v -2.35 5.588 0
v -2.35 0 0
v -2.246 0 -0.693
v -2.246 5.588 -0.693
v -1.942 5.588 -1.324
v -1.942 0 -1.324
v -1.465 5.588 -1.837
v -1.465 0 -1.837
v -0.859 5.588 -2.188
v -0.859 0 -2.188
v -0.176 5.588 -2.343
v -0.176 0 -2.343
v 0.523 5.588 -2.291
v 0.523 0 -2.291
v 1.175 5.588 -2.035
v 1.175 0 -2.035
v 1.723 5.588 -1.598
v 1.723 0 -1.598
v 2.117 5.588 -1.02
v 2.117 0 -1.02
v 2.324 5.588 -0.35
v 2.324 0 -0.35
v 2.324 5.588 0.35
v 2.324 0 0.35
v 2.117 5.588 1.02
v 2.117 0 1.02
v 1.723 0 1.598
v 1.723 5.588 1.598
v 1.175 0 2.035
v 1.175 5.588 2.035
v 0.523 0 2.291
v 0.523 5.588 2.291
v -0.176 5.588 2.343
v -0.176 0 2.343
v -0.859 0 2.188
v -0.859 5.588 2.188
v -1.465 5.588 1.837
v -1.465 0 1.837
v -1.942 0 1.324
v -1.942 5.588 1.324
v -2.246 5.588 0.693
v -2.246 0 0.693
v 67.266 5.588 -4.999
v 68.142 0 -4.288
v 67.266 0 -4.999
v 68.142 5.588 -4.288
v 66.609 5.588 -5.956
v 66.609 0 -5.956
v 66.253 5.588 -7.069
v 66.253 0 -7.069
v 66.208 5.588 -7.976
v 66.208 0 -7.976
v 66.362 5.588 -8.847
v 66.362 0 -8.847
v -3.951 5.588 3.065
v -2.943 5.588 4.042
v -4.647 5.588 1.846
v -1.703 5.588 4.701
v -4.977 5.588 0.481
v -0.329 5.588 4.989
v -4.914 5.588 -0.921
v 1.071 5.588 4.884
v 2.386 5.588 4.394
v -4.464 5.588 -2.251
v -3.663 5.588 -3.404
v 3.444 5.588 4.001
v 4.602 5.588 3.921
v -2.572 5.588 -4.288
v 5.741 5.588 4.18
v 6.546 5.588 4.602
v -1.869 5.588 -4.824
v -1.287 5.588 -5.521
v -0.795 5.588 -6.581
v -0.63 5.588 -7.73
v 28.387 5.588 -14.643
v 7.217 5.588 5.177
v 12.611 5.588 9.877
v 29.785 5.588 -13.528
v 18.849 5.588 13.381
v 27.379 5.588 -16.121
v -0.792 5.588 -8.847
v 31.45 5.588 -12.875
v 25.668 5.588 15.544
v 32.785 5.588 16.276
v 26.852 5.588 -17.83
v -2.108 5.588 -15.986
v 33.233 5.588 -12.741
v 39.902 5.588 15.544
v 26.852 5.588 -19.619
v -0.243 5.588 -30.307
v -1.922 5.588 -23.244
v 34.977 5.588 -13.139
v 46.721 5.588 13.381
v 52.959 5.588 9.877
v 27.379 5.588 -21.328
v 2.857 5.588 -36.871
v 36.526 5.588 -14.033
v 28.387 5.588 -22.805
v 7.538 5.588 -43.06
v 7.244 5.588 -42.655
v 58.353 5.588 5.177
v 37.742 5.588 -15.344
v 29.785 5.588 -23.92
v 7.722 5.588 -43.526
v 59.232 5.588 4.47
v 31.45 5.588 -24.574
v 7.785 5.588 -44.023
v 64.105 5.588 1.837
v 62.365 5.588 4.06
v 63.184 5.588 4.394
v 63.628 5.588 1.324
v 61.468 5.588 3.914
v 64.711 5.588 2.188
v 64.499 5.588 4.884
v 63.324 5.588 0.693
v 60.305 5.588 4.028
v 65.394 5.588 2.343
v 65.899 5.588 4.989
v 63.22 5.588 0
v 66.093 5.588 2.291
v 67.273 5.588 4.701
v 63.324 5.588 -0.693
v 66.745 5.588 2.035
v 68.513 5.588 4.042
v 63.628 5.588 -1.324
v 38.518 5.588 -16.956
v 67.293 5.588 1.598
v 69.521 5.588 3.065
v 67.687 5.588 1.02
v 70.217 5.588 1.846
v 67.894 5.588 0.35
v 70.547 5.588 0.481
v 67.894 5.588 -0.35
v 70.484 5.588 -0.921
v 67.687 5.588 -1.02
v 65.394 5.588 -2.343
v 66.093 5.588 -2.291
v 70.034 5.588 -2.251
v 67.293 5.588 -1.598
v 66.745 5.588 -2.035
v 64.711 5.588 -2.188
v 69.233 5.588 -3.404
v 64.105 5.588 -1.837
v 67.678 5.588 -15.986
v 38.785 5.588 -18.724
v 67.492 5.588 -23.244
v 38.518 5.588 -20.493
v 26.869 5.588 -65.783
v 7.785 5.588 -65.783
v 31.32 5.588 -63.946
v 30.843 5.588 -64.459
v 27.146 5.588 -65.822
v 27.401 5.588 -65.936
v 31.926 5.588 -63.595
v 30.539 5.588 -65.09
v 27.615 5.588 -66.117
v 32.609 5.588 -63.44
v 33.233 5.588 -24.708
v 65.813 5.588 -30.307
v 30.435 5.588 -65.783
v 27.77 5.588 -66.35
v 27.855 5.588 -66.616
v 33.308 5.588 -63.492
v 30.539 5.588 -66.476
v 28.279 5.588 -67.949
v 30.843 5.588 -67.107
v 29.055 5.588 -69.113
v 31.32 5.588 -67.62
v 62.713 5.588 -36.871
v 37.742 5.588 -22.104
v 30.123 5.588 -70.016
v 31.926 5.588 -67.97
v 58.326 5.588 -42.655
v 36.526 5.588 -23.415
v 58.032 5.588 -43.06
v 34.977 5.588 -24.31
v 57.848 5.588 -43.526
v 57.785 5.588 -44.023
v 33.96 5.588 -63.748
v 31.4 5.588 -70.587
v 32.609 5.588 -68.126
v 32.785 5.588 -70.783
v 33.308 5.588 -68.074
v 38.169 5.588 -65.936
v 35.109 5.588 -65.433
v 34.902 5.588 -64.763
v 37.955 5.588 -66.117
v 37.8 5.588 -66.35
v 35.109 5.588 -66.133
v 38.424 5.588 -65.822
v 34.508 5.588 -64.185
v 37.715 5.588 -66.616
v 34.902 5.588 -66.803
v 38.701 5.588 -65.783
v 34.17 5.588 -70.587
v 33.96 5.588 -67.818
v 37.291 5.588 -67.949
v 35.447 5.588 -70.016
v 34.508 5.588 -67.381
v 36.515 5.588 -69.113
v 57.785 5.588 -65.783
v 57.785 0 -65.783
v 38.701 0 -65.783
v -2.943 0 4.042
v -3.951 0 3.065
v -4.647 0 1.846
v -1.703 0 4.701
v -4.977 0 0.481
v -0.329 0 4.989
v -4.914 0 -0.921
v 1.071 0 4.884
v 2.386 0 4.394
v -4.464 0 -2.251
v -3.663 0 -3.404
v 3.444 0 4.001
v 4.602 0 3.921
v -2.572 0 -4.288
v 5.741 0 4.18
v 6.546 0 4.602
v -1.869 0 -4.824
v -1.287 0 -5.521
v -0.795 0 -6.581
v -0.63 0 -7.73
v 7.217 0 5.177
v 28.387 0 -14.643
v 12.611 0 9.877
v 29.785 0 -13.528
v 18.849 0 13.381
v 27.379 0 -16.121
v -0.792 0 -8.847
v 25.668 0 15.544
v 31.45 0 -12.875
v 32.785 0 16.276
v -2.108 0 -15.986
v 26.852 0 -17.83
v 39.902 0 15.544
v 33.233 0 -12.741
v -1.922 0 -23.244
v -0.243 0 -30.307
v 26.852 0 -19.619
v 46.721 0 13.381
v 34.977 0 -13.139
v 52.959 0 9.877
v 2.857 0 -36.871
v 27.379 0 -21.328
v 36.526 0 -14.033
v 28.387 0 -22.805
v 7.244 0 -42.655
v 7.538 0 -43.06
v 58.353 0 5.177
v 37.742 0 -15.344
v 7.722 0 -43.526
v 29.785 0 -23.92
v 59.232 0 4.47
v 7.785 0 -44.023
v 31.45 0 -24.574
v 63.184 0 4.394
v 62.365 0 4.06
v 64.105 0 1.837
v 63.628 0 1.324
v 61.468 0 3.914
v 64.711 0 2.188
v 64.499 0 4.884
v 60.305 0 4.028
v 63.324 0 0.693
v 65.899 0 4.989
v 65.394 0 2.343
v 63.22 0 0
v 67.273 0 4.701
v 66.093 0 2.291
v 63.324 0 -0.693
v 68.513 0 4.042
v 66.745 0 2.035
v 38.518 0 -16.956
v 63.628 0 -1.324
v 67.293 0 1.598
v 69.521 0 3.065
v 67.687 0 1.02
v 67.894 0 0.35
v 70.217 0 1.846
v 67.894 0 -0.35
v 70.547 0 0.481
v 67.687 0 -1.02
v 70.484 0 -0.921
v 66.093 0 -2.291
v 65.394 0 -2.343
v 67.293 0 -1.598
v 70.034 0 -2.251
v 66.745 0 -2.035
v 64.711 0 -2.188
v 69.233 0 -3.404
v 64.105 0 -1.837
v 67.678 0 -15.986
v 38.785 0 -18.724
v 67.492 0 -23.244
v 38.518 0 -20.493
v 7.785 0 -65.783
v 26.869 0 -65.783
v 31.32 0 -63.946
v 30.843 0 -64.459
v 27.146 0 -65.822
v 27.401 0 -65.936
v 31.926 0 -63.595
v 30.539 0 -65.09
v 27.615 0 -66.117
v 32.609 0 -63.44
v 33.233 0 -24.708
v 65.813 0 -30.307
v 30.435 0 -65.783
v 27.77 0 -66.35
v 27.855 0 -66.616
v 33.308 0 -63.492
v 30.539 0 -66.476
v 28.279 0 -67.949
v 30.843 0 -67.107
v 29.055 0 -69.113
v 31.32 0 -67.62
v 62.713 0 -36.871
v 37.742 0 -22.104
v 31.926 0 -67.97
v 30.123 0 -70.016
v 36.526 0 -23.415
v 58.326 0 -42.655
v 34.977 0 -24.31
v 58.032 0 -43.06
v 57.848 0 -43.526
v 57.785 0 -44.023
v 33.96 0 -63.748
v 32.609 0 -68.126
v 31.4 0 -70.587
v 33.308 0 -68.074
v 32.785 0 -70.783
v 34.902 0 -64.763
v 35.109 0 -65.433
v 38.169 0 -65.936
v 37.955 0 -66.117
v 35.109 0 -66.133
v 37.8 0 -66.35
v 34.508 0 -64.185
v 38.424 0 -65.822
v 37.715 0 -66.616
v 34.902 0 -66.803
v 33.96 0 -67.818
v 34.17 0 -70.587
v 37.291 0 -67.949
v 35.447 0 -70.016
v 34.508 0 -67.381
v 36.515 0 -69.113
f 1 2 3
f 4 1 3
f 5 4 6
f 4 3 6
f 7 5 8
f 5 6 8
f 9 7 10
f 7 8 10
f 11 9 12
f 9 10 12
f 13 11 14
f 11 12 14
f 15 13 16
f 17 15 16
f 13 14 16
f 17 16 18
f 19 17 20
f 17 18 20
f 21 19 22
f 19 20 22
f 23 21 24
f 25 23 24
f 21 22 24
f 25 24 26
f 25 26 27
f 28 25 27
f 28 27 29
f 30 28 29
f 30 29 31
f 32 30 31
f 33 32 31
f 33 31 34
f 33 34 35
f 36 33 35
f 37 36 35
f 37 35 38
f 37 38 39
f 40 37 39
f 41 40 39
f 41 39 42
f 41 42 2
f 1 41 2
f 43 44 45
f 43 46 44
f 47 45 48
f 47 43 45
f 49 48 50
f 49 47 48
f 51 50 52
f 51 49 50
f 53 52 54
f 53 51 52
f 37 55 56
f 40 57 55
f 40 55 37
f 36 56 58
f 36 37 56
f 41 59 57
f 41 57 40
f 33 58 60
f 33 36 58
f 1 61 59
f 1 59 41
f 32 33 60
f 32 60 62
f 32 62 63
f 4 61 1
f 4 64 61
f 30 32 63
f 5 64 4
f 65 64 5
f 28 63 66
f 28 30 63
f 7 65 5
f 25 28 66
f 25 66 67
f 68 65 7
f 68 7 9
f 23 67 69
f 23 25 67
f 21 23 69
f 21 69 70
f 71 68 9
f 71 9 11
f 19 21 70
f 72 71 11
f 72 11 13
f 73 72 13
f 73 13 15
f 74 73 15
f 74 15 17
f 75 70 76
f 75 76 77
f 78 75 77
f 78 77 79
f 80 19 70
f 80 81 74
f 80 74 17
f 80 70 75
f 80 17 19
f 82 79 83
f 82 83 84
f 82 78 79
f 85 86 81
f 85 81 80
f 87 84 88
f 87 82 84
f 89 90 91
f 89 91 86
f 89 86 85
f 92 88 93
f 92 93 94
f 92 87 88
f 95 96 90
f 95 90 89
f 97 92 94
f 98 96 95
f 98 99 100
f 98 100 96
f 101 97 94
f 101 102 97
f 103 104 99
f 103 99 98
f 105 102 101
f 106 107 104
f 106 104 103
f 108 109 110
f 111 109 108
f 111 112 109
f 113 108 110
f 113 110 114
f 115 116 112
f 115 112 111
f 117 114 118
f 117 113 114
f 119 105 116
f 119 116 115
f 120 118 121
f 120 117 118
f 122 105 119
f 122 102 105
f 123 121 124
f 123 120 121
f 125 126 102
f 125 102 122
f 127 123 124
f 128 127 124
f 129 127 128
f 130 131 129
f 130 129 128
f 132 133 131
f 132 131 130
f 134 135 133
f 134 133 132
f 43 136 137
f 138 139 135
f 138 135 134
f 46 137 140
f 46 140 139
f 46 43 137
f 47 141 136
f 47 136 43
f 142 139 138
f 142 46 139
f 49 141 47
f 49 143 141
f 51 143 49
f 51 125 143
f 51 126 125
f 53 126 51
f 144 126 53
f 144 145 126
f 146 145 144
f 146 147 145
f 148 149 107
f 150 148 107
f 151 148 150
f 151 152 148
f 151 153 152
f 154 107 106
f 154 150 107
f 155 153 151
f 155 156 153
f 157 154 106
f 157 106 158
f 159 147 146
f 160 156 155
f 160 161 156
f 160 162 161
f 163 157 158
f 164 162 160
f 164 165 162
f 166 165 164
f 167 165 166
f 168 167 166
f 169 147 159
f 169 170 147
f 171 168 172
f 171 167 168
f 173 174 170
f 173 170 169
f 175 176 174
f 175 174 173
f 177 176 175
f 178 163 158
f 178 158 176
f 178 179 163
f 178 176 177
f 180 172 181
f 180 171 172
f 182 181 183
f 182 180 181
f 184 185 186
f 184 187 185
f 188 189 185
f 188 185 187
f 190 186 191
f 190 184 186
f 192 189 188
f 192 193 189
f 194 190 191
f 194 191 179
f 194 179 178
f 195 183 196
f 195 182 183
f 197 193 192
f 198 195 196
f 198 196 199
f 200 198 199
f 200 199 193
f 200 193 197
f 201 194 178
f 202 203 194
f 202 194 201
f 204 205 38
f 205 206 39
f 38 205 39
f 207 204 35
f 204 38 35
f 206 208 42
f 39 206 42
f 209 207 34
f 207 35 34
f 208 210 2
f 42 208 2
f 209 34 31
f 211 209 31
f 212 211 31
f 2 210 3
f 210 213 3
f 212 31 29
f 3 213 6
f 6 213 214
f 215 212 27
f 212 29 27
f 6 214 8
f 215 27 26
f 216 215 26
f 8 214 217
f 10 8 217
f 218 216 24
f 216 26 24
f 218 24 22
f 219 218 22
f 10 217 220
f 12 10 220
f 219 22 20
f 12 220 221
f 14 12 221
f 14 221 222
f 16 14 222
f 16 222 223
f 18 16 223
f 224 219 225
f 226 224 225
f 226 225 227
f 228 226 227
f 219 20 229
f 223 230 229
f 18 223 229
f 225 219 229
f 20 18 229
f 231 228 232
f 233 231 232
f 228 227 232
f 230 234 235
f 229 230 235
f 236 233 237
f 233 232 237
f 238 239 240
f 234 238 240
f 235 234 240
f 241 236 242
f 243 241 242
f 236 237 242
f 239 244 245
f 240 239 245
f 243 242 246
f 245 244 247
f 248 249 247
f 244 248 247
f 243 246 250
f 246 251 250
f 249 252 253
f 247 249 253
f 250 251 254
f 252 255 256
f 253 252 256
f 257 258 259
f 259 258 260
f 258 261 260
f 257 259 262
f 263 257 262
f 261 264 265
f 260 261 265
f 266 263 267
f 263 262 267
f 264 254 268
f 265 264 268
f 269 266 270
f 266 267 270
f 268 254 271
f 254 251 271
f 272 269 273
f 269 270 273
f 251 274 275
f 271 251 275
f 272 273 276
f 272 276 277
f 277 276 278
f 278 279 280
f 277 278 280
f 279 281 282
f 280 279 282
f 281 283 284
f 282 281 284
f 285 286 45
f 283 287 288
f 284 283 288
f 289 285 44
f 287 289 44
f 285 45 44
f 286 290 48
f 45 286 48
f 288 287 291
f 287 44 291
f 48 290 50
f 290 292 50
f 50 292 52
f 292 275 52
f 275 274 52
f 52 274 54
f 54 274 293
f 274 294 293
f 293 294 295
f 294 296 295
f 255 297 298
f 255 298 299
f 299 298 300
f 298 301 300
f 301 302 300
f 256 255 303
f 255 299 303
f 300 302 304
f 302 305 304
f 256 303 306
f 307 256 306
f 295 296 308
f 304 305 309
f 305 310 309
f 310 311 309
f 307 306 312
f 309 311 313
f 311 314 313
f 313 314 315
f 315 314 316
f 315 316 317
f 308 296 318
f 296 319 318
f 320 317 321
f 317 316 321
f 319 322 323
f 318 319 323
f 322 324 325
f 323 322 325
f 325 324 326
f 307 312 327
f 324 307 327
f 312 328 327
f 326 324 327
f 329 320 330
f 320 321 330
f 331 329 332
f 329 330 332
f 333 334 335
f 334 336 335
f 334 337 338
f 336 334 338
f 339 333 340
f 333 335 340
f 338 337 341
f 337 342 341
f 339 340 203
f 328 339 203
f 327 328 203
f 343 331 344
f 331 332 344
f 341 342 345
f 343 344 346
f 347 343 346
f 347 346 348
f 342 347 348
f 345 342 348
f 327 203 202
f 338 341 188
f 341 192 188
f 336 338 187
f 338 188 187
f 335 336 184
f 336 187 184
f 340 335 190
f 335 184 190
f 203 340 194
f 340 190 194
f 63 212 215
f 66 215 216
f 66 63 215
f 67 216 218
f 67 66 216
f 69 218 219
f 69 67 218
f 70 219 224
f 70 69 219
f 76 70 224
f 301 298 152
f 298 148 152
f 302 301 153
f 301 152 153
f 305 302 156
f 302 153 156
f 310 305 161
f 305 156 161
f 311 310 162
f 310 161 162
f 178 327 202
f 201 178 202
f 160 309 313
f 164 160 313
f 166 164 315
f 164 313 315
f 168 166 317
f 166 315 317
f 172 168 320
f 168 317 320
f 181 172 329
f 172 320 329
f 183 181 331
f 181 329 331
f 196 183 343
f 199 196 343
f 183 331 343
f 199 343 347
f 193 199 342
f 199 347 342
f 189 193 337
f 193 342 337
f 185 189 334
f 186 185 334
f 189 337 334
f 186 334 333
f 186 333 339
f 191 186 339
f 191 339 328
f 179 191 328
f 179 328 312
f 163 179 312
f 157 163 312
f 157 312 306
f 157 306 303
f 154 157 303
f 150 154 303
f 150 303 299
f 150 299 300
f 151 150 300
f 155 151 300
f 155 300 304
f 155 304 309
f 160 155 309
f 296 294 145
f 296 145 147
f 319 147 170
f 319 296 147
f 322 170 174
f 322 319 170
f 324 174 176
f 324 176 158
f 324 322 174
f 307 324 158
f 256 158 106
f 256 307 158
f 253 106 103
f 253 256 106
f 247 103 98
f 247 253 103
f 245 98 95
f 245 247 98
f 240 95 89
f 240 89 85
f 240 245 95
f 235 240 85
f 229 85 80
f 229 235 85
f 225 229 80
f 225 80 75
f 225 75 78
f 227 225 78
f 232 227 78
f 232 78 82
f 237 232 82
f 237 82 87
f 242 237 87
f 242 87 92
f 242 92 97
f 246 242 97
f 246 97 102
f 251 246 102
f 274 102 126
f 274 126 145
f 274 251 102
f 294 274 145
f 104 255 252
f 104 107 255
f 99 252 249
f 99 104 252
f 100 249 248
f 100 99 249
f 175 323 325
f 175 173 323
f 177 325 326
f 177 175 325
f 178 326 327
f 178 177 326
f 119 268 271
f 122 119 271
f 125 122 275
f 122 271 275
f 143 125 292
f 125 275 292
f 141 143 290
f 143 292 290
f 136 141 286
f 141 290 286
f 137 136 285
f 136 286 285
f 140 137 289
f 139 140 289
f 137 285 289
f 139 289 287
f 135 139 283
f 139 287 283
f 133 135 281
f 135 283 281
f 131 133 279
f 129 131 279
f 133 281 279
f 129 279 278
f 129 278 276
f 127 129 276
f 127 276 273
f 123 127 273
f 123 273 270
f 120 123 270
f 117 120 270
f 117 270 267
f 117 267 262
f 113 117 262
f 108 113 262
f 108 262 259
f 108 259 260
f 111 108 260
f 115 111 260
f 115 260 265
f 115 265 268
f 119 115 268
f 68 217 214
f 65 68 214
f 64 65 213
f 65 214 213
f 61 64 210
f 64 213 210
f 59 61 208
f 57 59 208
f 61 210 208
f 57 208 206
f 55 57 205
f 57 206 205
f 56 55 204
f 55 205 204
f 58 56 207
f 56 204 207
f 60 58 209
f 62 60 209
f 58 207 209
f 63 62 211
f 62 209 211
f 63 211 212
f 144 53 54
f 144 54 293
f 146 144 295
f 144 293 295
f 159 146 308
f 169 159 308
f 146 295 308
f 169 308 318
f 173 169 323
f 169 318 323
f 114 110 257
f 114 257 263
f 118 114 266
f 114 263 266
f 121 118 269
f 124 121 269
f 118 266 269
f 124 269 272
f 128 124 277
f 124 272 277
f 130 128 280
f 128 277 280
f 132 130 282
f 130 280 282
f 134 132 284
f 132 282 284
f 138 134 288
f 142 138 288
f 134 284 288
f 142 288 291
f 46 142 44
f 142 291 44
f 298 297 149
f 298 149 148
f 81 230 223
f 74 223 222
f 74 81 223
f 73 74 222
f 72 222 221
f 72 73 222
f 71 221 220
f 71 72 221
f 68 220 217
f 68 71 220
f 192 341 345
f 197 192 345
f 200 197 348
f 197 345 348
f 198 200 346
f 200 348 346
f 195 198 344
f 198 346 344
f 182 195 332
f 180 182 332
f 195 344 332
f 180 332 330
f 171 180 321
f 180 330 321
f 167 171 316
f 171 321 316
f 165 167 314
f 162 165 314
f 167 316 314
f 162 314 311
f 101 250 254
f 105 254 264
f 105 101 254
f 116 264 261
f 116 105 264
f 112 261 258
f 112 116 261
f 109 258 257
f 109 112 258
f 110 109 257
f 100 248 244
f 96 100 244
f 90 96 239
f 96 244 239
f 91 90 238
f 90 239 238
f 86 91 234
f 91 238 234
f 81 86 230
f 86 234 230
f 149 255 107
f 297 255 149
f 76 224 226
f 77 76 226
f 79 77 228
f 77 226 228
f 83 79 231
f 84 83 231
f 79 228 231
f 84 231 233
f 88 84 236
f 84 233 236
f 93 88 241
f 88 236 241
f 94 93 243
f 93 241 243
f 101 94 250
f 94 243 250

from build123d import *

# Parameters (mm, degrees)
SKETCH1_R                  = 35
SKETCH1_R_2                = 6
SKETCH1_R_3                = 5
SKETCH1_W                  = 50
SKETCH1_H                  = 25
BOSS_EXTRUDE2_DEPTH        = 5.588
F_4_7_4_7_DIAMETER_HOLE1_D = 4.7
FILLET1_R                  = 1
FILLET2_R                  = 1
FILLET6_R                  = 4
FILLET7_R                  = 4
FILLET8_R                  = 4
FILLET9_R                  = 2
FILLET10_R                 = 2


with BuildPart() as part:
    # Sketch1 → Boss-Extrude2 (new body)
    with BuildSketch(Plane(origin=(0, 0, 0), x_dir=(1, 0, 0), z_dir=(0, 1, 0))):
        with Locations((32.785, 18.724314586)):
            Circle(SKETCH1_R)
        with Locations((32.785, 18.724314586)):
            Circle(SKETCH1_R_2, mode=Mode.SUBTRACT)
        with Locations((65.57, 0)):
            Circle(SKETCH1_R_3)
        Circle(SKETCH1_R_3)
        with Locations((32.785, 65.782929207)):
            Circle(SKETCH1_R_3)
        with Locations((32.785, 53.282929207)):
            Rectangle(SKETCH1_W, SKETCH1_H)
    extrude(amount=BOSS_EXTRUDE2_DEPTH)

    # Ø4.7 (4.7) Diameter Hole1 (through all)
    with Locations(Plane(origin=(0, 5.588, 0), x_dir=(1, 0, 0), z_dir=(0, 1, 0))):
        with Locations((0, 0), (65.57, 0), (32.785, 65.782929207)):
            Hole(F_4_7_4_7_DIAMETER_HOLE1_D / 2)

    # Fillet1
    fillet1_edges = [part.edges().sort_by_distance(p)[0] for p in [
        (27.785, 2.794, -65.782929207),
    ]]
    fillet(fillet1_edges, radius=FILLET1_R)

    # Fillet2
    fillet2_edges = [part.edges().sort_by_distance(p)[0] for p in [
        (37.785, 2.794, -65.782929207),
    ]]
    fillet(fillet2_edges, radius=FILLET2_R)

    # Fillet6
    fillet6_edges = [part.edges().sort_by_distance(p)[0] for p in [
        (0.603671593, 2.794, -4.963424282),
    ]]
    fillet(fillet6_edges, radius=FILLET6_R)

    # Fillet7
    fillet7_edges = [part.edges().sort_by_distance(p)[0] for p in [
        (4.581742742, 2.794, 2.001907453),
    ]]
    fillet(fillet7_edges, radius=FILLET7_R)

    # Fillet8
    fillet8_edges = [part.edges().sort_by_distance(p)[0] for p in [
        (60.988257258, 2.794, 2.001907453),
        (64.966328407, 2.794, -4.963424282),
    ]]
    fillet(fillet8_edges, radius=FILLET8_R)

    # Fillet9
    fillet9_edges = [part.edges().sort_by_distance(p)[0] for p in [
        (57.785, 2.794, -43.219212014),
    ]]
    fillet(fillet9_edges, radius=FILLET9_R)

    # Fillet10
    fillet10_edges = [part.edges().sort_by_distance(p)[0] for p in [
        (7.785, 2.794, -43.219212014),
    ]]
    fillet(fillet10_edges, radius=FILLET10_R)


solid = part.part
